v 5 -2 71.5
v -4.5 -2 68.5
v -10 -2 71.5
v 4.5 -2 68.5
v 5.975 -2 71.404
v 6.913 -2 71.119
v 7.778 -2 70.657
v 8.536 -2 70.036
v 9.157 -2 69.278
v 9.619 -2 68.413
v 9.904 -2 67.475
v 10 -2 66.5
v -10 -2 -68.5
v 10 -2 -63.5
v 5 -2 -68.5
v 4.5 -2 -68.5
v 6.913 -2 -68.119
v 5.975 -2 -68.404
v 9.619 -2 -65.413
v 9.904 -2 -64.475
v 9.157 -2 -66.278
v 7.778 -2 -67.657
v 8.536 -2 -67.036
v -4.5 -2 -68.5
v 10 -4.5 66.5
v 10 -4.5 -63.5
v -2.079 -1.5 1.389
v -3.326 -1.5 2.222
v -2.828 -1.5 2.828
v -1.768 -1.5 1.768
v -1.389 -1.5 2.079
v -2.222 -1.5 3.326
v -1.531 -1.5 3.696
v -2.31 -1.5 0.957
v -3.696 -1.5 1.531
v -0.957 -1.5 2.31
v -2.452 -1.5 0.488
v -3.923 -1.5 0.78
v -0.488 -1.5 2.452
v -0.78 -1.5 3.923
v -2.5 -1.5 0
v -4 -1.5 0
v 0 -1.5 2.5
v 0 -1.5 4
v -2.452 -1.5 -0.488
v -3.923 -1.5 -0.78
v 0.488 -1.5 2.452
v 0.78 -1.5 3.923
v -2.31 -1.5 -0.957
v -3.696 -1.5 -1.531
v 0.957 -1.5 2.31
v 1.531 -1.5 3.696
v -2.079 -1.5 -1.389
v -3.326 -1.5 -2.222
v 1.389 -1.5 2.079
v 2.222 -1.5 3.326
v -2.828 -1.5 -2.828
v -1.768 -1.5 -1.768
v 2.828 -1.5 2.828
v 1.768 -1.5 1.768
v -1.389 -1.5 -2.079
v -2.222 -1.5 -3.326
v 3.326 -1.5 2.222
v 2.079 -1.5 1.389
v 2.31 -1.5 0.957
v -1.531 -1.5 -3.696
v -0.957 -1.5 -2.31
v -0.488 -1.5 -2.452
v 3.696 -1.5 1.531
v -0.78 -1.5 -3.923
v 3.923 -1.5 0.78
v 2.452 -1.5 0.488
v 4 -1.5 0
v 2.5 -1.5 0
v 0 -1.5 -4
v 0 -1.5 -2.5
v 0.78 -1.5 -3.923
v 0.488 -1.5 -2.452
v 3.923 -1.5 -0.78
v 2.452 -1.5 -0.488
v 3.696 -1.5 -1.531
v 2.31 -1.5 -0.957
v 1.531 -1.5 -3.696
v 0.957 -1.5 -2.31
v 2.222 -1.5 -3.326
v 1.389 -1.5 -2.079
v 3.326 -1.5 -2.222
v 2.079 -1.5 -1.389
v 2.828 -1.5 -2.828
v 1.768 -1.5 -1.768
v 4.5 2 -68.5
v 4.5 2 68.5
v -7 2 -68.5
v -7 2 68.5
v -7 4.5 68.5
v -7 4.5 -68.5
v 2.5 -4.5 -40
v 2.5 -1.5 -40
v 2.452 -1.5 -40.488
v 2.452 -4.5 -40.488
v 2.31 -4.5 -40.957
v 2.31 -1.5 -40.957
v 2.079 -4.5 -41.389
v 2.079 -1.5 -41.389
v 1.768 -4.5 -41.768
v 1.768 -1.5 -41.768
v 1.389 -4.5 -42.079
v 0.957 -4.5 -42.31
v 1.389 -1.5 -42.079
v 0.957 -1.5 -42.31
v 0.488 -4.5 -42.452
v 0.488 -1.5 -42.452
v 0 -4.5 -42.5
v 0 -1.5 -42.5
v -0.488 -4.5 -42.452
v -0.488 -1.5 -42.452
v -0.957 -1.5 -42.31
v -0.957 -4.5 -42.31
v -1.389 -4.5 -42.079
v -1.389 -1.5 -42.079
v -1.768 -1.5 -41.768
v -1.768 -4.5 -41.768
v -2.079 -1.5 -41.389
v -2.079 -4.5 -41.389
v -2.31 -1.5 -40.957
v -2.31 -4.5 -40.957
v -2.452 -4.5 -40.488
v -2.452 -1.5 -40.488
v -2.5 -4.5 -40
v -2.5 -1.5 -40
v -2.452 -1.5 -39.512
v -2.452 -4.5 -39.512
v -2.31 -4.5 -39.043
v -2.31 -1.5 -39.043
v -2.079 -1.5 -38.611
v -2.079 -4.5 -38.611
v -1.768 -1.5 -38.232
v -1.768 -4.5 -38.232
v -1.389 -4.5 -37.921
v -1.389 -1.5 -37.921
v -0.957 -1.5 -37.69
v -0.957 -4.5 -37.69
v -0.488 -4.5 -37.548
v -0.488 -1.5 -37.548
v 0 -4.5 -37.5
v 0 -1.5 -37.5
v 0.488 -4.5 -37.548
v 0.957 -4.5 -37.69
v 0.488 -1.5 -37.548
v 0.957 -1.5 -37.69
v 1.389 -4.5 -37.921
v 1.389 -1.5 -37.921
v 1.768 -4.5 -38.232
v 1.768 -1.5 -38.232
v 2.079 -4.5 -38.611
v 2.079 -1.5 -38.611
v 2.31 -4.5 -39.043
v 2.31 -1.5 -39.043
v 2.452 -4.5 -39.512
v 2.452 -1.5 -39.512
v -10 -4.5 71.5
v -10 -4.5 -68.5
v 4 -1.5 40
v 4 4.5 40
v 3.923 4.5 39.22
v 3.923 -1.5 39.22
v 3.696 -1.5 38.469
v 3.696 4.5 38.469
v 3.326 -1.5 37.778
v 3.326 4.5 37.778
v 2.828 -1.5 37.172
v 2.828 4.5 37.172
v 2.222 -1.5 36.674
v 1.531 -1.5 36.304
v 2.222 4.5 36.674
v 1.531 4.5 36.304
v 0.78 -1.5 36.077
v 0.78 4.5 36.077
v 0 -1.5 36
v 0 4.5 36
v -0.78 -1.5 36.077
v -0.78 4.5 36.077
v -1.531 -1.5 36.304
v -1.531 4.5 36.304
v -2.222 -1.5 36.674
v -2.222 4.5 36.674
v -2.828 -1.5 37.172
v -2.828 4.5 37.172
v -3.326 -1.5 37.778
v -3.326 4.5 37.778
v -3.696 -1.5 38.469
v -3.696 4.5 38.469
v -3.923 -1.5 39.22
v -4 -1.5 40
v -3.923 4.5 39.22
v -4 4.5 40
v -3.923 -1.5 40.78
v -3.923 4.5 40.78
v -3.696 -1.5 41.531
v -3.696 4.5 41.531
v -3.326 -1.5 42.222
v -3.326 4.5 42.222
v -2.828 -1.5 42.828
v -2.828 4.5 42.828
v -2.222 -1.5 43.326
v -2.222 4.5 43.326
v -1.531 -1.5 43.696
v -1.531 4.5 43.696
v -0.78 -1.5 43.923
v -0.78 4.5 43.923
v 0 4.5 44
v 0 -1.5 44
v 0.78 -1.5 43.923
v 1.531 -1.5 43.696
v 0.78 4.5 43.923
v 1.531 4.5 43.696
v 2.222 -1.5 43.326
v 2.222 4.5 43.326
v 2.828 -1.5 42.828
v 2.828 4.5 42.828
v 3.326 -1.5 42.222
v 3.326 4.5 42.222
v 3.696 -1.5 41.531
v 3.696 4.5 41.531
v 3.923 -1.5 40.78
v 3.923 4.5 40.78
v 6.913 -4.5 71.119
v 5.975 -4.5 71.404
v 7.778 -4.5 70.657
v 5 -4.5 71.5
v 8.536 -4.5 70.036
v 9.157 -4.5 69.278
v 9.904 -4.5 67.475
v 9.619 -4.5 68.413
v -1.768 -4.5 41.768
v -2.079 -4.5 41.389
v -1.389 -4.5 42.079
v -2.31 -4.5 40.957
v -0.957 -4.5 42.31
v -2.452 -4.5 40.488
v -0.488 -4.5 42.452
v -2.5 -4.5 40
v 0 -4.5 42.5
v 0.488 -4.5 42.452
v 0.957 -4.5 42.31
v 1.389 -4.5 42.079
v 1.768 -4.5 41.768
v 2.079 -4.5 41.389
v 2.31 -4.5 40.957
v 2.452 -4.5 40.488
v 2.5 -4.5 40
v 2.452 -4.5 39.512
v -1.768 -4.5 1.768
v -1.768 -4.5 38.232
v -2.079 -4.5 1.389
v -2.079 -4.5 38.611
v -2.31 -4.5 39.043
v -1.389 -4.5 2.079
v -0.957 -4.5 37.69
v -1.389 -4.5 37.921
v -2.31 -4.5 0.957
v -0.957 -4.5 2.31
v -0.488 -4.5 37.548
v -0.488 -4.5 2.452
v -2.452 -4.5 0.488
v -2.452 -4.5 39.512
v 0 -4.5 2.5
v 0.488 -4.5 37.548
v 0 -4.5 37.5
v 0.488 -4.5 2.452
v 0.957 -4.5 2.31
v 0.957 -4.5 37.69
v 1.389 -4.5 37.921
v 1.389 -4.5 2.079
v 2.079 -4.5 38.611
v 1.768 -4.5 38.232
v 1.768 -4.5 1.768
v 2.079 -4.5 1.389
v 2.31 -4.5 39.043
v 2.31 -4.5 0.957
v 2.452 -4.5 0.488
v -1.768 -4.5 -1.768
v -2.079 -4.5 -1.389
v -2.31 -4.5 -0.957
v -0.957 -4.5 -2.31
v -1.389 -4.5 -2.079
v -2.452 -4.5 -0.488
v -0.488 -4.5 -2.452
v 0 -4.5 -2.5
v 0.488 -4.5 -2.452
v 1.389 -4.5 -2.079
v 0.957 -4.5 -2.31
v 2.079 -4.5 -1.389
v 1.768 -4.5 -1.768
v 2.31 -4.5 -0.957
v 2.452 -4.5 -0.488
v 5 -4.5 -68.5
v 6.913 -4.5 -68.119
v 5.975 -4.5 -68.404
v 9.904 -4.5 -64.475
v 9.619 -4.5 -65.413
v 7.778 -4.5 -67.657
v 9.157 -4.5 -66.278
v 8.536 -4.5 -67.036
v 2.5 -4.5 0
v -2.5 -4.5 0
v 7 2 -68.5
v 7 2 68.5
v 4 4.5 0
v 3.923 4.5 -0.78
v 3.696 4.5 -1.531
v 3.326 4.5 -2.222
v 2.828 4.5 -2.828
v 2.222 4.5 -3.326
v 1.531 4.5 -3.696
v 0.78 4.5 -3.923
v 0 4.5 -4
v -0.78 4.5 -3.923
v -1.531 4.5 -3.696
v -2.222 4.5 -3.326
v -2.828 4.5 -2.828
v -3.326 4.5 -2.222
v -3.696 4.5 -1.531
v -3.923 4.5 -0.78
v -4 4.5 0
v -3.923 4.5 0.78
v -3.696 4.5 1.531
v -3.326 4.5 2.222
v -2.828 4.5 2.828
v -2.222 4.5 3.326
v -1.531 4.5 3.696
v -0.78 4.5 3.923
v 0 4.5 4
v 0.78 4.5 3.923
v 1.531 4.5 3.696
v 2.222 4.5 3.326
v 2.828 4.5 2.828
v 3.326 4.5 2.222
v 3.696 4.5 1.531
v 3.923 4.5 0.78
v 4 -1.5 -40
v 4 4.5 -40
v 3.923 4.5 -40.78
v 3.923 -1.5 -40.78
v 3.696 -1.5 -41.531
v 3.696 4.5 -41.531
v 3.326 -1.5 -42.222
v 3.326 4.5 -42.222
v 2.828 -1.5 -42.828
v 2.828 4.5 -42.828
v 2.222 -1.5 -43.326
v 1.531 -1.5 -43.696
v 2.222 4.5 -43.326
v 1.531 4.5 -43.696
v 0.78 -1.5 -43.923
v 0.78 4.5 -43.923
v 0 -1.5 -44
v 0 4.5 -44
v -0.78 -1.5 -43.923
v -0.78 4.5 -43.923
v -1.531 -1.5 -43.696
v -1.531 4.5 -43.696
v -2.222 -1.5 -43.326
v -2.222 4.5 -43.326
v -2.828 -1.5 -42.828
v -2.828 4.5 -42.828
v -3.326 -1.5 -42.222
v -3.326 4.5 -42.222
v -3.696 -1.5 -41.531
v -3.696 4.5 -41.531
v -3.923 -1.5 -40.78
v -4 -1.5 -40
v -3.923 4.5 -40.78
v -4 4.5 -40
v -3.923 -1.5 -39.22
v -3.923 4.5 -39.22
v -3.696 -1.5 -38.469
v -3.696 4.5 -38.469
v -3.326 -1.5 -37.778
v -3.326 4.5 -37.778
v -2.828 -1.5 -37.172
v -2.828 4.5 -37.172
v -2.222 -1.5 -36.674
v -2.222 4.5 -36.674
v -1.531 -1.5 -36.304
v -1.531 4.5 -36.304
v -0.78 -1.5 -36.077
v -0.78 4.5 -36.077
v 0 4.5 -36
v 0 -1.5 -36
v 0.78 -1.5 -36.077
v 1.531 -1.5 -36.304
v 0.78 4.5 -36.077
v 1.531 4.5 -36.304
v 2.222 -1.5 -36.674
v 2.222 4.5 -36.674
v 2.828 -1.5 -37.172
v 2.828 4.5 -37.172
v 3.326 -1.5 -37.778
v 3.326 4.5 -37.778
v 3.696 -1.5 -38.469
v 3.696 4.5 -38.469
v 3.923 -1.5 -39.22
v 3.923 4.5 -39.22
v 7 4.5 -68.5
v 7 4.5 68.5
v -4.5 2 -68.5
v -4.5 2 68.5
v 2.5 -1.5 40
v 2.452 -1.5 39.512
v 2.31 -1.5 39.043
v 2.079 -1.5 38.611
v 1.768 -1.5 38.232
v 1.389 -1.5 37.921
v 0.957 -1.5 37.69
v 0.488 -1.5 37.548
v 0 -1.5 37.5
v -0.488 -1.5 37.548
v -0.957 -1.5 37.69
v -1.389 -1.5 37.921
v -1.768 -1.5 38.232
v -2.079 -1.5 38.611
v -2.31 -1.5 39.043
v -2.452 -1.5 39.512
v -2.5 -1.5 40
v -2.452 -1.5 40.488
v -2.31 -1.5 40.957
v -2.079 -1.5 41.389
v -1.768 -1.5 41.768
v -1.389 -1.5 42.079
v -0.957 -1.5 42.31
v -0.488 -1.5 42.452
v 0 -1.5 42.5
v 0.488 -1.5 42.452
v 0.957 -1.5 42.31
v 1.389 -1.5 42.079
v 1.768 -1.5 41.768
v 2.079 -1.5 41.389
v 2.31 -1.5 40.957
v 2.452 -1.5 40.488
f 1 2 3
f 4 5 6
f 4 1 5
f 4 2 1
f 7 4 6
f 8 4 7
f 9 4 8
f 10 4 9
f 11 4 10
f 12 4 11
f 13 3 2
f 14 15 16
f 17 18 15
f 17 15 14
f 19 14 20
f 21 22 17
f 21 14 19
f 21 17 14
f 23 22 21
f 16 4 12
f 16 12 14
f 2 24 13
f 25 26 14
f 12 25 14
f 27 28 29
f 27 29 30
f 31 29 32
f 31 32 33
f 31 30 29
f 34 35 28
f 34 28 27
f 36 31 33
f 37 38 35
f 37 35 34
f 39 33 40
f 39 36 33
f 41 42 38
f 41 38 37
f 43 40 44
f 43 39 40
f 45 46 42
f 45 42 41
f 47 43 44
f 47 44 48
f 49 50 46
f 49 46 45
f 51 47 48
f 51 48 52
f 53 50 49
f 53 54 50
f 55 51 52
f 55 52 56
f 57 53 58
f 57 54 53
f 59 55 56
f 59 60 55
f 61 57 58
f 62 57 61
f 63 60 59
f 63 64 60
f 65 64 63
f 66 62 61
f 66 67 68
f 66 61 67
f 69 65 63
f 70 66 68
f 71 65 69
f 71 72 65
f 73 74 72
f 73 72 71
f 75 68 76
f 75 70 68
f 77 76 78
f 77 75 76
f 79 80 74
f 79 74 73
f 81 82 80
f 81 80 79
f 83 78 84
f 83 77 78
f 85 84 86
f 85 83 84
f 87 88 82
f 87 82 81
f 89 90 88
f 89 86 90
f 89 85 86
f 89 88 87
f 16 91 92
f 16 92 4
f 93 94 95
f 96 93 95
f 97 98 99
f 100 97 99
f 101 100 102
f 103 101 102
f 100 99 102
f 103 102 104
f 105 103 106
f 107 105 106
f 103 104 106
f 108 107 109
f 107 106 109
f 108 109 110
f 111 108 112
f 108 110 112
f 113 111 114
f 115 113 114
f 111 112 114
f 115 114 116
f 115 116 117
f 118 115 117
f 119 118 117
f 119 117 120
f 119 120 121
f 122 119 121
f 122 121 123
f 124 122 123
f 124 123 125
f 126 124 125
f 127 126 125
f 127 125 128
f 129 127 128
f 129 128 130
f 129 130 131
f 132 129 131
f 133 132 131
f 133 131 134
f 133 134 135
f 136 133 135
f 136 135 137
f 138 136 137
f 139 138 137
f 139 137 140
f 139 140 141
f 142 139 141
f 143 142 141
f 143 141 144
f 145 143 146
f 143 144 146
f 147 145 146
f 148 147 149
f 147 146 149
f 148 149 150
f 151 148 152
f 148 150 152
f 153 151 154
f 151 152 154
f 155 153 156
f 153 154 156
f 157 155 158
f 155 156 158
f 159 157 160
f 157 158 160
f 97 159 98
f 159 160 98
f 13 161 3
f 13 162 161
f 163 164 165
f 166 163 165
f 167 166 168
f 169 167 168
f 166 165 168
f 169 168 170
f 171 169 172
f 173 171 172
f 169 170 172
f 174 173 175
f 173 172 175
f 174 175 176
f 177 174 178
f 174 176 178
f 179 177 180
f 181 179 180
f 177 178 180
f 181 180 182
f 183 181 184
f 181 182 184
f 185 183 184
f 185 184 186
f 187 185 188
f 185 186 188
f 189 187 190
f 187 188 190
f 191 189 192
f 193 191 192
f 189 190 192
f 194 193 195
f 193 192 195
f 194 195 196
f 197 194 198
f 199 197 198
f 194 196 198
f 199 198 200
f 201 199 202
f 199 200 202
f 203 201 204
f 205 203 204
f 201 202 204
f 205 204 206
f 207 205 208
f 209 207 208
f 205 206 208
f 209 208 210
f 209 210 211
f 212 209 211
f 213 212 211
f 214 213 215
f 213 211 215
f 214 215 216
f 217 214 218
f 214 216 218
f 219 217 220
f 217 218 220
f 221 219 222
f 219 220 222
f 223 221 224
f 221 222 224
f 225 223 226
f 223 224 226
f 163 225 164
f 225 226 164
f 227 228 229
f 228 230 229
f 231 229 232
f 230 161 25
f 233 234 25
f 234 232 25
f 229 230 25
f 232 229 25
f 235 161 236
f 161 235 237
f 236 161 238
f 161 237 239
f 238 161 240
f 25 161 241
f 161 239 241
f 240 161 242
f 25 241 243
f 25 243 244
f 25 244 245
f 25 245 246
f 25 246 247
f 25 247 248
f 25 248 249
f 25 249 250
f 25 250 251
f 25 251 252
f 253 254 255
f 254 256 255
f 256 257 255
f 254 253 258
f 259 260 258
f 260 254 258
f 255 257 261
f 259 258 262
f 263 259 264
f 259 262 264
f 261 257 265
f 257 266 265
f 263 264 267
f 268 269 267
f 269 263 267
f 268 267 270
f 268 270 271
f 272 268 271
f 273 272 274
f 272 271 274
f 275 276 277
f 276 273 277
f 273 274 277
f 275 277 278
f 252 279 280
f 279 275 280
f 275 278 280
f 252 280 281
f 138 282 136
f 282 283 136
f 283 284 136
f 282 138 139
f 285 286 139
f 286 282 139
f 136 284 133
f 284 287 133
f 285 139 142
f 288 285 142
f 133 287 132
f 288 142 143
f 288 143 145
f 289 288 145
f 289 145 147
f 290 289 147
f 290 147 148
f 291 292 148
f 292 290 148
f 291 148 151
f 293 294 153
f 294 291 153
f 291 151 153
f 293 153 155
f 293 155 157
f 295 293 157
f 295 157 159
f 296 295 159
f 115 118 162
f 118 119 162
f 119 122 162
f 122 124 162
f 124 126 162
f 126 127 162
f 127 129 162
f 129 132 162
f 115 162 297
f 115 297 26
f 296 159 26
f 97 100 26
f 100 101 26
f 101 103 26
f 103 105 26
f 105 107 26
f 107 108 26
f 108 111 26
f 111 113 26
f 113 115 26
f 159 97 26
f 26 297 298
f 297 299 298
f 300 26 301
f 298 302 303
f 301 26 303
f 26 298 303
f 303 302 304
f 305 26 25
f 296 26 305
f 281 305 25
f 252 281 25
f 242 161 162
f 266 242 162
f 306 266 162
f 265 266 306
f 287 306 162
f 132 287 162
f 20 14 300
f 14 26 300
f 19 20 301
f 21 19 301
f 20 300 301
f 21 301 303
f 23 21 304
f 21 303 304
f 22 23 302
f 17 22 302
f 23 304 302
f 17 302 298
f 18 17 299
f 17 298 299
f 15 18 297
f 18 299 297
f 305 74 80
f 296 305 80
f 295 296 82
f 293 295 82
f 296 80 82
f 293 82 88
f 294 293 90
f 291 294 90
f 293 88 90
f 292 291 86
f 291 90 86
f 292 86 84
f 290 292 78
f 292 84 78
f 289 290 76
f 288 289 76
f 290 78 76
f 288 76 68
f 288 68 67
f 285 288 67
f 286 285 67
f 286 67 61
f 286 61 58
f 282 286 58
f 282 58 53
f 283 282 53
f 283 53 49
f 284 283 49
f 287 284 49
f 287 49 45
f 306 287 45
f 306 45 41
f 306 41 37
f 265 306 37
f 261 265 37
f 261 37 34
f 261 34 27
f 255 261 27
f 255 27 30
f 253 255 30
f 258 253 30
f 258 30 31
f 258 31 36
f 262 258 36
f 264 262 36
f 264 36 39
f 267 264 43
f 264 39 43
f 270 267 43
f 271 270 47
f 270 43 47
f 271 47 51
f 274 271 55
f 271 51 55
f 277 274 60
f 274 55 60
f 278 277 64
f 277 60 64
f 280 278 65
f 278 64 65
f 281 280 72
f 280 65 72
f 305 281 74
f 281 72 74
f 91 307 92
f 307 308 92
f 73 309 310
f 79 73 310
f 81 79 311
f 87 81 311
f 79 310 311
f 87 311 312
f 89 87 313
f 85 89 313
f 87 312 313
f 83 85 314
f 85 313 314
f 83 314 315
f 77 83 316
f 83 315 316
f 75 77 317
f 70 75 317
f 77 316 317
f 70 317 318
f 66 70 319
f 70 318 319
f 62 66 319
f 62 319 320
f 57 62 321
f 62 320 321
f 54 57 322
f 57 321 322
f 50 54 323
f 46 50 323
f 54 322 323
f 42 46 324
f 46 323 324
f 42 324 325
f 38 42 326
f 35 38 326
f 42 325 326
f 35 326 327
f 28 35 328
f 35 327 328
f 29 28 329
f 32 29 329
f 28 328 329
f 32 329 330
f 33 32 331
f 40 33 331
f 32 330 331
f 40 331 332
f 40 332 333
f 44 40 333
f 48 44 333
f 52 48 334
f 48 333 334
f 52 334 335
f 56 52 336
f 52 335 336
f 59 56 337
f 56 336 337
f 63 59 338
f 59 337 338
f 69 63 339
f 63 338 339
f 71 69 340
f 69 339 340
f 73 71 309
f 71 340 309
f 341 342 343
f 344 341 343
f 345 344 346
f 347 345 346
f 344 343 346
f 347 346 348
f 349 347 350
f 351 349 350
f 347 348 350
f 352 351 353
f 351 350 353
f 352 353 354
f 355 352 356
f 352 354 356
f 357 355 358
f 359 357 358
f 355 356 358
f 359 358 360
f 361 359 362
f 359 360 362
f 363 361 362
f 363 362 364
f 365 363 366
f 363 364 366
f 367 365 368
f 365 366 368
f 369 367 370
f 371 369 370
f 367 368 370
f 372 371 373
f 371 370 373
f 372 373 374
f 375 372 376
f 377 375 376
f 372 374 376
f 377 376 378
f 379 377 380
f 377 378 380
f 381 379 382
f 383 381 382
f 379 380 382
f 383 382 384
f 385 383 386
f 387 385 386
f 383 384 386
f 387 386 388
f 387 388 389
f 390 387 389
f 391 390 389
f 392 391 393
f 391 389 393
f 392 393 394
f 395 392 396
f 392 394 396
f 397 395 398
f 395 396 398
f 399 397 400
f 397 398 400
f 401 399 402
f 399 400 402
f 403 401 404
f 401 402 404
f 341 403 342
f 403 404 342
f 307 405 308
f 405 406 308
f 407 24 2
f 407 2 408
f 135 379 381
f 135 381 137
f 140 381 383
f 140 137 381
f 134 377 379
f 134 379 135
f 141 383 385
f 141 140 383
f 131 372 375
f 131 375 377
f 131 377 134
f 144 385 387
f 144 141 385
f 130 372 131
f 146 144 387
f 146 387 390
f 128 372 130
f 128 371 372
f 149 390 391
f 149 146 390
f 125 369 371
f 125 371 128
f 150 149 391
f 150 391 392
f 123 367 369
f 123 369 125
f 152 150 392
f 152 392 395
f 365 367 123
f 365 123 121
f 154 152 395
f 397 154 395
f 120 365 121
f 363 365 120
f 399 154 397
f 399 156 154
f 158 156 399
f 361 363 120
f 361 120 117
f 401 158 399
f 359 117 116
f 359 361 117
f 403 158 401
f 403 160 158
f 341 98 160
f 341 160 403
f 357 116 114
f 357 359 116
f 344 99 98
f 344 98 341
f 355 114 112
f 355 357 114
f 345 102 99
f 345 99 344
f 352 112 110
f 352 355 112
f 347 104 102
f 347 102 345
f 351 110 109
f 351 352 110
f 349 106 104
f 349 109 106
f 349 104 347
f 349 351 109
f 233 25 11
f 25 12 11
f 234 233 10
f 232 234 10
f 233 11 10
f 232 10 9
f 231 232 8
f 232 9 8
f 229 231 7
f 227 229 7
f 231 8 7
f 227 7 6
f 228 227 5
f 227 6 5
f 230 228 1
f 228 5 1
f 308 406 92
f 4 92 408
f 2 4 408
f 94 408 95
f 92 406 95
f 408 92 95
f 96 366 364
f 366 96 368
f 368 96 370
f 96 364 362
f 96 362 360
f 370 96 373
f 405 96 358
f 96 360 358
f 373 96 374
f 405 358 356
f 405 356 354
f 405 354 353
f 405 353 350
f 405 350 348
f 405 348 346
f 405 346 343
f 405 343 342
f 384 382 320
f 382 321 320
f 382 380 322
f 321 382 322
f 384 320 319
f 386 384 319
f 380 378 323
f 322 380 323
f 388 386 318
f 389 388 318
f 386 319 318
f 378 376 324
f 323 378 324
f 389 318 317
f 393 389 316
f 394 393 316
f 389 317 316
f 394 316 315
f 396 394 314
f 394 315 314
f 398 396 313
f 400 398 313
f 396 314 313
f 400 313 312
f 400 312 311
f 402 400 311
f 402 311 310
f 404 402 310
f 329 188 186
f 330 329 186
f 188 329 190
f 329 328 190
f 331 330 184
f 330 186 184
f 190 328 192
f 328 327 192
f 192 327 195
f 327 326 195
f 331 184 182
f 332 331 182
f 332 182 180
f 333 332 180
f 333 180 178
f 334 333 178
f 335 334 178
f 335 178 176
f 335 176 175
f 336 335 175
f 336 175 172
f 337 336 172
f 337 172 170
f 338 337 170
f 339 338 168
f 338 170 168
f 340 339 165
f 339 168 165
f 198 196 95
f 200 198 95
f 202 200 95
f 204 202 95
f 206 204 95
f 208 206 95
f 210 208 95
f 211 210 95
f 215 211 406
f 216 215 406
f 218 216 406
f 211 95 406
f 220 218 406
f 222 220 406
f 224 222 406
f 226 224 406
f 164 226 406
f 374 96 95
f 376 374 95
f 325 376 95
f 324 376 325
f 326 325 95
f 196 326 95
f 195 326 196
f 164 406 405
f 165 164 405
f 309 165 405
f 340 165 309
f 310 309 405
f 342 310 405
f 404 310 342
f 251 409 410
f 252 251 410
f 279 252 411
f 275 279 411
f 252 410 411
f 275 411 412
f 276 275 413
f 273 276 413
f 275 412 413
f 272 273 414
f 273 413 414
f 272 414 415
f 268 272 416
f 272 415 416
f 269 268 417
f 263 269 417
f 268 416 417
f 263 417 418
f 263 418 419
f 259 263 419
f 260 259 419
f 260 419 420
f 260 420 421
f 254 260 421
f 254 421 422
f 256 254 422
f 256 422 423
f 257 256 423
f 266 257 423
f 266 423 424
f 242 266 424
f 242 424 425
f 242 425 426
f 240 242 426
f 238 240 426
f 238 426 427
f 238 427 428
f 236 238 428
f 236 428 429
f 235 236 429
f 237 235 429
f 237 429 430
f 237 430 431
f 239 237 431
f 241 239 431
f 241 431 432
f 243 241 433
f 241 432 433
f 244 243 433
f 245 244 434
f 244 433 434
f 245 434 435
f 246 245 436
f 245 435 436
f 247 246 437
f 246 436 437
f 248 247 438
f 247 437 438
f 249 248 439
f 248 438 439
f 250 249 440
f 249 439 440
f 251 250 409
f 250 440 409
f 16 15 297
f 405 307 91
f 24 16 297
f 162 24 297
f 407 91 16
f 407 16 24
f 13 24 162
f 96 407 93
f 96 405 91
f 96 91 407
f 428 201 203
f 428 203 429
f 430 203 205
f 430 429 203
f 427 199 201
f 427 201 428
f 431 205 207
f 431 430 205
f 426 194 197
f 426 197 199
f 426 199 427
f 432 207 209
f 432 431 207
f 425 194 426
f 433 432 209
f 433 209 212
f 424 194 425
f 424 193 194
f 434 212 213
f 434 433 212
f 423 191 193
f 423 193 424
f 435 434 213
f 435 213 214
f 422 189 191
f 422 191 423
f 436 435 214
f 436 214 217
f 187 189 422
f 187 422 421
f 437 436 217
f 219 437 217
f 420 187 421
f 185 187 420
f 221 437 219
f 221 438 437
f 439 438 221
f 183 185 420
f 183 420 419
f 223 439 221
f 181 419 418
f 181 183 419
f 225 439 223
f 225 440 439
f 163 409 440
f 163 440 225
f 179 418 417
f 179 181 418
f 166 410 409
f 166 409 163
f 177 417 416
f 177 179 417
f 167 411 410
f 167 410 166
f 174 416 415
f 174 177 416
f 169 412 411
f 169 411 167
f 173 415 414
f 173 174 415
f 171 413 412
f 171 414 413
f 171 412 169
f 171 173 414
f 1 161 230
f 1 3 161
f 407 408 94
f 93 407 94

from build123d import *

# Parameters (mm, degrees)
BOSS_EXTRUDE2_DEPTH = 68.5
SKETCH4_R           = 4
CUT_EXTRUDE1_DEPTH  = 6
SKETCH5_R           = 2.5
CUT_EXTRUDE2_DEPTH  = 4
SKETCH7_W           = 20
SKETCH7_H           = 2.5
BOSS_EXTRUDE6_DEPTH = 3
FILLET2_R           = 5


with BuildPart() as part:
    # Sketch1 → Boss-Extrude2 (new body, symmetric)
    with BuildSketch(Plane.XY):
        Polygon((-7, 4.5), (7, 4.5), (7, 2), (4.5, 2), (4.5, -2), (10, -2), (10, -4.5), (-10, -4.5), (-10, -2), (-4.5, -2), (-4.5, 2), (-7, 2), align=None)
    extrude(amount=BOSS_EXTRUDE2_DEPTH, both=True)

    # Sketch4 → Cut-Extrude1 (cut)
    with BuildSketch(Plane(origin=(0, 4.5, 0), x_dir=(1, 0, 0), z_dir=(0, 1, 0))):
        Circle(SKETCH4_R)
        with Locations((0, 40)):
            Circle(SKETCH4_R)
        with Locations((0, -40)):
            Circle(SKETCH4_R)
    extrude(amount=-CUT_EXTRUDE1_DEPTH, mode=Mode.SUBTRACT)

    # Sketch5 → Cut-Extrude2 (cut)
    with BuildSketch(Plane(origin=(0, -1.5, 0), x_dir=(1, 0, 0), z_dir=(0, 1, 0))):
        with Locations((0, 40)):
            Circle(SKETCH5_R)
        Circle(SKETCH5_R)
        with Locations((0, -40)):
            Circle(SKETCH5_R)
    extrude(amount=-CUT_EXTRUDE2_DEPTH, mode=Mode.SUBTRACT)

    # Sketch7 → Boss-Extrude6 (add)
    with BuildSketch(Plane.XY.offset(68.5)):
        with Locations((0, -3.25)):
            Rectangle(SKETCH7_W, SKETCH7_H)
    extrude(amount=BOSS_EXTRUDE6_DEPTH)

    # Fillet2
    fillet2_edges = [part.edges().sort_by_distance(p)[0] for p in [
        (10, -3.25, -68.5),
        (10, -3.25, 71.5),
    ]]
    fillet(fillet2_edges, radius=FILLET2_R)


solid = part.part
